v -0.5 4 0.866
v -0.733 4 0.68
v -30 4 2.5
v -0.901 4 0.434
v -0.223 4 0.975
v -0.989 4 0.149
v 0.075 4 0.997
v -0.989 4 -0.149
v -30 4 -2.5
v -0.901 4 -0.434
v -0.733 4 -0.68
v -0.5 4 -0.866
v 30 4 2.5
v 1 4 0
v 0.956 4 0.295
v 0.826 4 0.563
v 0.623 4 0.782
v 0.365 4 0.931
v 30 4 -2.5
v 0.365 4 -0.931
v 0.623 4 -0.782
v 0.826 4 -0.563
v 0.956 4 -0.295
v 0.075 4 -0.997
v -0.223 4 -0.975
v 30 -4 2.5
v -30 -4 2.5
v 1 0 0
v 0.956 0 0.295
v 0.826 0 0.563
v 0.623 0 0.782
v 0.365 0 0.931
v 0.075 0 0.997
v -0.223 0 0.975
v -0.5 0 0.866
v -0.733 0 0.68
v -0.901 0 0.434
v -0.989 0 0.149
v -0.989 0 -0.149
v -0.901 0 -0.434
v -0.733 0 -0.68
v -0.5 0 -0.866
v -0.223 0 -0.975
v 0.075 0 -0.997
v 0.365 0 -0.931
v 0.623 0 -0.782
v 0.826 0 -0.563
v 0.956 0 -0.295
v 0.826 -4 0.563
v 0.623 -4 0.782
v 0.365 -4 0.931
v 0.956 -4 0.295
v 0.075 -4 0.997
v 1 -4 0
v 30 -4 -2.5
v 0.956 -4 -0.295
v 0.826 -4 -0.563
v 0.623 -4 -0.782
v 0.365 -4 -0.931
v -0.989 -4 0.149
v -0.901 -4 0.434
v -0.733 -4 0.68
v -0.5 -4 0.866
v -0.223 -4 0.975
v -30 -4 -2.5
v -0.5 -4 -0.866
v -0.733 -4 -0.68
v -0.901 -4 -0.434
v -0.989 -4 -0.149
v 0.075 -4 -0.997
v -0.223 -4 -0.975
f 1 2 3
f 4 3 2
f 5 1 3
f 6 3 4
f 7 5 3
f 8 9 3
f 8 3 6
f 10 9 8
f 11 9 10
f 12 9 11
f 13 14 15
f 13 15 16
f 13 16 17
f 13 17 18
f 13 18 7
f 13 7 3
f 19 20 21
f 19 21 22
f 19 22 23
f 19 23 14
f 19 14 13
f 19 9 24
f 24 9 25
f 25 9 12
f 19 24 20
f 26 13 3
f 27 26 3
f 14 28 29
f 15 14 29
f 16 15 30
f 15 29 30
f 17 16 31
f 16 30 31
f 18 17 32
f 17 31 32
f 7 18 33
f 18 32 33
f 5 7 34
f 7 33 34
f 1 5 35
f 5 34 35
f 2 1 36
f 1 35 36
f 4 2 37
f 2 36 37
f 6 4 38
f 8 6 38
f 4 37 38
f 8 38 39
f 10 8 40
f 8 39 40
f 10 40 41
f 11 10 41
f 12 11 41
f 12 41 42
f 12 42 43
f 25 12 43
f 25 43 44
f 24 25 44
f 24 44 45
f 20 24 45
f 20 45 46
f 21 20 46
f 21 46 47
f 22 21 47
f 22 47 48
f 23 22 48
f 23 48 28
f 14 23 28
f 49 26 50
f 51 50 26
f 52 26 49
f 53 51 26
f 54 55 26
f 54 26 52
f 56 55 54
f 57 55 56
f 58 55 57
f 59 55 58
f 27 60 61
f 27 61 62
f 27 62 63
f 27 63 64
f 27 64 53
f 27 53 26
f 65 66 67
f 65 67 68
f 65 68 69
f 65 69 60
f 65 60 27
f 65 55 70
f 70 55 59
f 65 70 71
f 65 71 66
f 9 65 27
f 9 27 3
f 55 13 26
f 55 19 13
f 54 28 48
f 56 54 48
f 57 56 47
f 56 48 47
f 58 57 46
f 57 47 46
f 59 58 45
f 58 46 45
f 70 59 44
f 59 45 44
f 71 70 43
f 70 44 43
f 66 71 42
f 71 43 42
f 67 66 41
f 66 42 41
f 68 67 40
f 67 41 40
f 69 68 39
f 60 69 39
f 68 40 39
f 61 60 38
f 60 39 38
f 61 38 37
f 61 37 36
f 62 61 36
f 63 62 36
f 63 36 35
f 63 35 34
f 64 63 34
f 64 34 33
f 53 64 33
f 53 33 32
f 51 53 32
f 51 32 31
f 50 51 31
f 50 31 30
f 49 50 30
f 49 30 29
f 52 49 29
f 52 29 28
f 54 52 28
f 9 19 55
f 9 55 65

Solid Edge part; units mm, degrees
sketch "Sketch1" plane through (0, 0, 0) normal (0, 0, 1) x (1, 0, 0)
  line L0 (30, -4) -> (-30, -4)
  line L1 (-30, -4) -> (-30, 4)
  line L2 (-30, 4) -> (30, 4)
  line L3 (30, 4) -> (30, -4)
extrude "Protrusion1" add sketch "Sketch1" along normal mid plane 5
sketch "Sketch2" plane through (0, 0, 0) normal (0, -1, 0) x (1, 0, 0)
  circle A0 centre (0, 0) radius 1
extrude "ExtrudedCutout_1" cut sketch "Sketch2" along normal mid plane 38.2729
